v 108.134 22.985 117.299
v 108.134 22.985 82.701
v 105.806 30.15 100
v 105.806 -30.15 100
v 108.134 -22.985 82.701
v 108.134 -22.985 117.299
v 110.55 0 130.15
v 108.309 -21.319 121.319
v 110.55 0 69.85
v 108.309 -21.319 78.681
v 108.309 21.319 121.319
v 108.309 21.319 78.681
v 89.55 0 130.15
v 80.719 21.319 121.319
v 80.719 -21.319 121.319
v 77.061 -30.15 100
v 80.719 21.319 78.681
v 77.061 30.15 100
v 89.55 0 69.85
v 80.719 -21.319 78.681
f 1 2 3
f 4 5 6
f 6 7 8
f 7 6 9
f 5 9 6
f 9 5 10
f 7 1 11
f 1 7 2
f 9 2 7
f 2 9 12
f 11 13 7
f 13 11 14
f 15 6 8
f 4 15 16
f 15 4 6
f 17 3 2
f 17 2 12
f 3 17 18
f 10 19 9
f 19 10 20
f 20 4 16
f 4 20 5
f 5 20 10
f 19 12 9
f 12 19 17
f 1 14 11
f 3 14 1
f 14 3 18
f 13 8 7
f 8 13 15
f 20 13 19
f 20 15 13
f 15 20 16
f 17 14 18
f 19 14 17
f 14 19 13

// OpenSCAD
branchOpening(verticalAngle=90,orientation=0);

module branchOpening(
    position=[-219.1/2,0,100],
    shellDiameter=219.1,    
    branchDiameter=60.3,    
    shellLength=500, 
    shellThickness=20, 
    verticalAngle=90, 
    verticalPosition=100,   
    sides=8,
    orientation=0
){
    rotate([0,0,180+orientation])
    difference(){
        intersection(){
            cylinder(h=shellLength,d=shellDiameter+2);
            translate(position)rotate([0,verticalAngle,0])
            cylinder(h=shellDiameter,d=branchDiameter,center=true,$fn=sides);
        }
        cylinder(h=shellLength,d=shellDiameter-2*shellThickness,$fn=sides);    
    }
}
